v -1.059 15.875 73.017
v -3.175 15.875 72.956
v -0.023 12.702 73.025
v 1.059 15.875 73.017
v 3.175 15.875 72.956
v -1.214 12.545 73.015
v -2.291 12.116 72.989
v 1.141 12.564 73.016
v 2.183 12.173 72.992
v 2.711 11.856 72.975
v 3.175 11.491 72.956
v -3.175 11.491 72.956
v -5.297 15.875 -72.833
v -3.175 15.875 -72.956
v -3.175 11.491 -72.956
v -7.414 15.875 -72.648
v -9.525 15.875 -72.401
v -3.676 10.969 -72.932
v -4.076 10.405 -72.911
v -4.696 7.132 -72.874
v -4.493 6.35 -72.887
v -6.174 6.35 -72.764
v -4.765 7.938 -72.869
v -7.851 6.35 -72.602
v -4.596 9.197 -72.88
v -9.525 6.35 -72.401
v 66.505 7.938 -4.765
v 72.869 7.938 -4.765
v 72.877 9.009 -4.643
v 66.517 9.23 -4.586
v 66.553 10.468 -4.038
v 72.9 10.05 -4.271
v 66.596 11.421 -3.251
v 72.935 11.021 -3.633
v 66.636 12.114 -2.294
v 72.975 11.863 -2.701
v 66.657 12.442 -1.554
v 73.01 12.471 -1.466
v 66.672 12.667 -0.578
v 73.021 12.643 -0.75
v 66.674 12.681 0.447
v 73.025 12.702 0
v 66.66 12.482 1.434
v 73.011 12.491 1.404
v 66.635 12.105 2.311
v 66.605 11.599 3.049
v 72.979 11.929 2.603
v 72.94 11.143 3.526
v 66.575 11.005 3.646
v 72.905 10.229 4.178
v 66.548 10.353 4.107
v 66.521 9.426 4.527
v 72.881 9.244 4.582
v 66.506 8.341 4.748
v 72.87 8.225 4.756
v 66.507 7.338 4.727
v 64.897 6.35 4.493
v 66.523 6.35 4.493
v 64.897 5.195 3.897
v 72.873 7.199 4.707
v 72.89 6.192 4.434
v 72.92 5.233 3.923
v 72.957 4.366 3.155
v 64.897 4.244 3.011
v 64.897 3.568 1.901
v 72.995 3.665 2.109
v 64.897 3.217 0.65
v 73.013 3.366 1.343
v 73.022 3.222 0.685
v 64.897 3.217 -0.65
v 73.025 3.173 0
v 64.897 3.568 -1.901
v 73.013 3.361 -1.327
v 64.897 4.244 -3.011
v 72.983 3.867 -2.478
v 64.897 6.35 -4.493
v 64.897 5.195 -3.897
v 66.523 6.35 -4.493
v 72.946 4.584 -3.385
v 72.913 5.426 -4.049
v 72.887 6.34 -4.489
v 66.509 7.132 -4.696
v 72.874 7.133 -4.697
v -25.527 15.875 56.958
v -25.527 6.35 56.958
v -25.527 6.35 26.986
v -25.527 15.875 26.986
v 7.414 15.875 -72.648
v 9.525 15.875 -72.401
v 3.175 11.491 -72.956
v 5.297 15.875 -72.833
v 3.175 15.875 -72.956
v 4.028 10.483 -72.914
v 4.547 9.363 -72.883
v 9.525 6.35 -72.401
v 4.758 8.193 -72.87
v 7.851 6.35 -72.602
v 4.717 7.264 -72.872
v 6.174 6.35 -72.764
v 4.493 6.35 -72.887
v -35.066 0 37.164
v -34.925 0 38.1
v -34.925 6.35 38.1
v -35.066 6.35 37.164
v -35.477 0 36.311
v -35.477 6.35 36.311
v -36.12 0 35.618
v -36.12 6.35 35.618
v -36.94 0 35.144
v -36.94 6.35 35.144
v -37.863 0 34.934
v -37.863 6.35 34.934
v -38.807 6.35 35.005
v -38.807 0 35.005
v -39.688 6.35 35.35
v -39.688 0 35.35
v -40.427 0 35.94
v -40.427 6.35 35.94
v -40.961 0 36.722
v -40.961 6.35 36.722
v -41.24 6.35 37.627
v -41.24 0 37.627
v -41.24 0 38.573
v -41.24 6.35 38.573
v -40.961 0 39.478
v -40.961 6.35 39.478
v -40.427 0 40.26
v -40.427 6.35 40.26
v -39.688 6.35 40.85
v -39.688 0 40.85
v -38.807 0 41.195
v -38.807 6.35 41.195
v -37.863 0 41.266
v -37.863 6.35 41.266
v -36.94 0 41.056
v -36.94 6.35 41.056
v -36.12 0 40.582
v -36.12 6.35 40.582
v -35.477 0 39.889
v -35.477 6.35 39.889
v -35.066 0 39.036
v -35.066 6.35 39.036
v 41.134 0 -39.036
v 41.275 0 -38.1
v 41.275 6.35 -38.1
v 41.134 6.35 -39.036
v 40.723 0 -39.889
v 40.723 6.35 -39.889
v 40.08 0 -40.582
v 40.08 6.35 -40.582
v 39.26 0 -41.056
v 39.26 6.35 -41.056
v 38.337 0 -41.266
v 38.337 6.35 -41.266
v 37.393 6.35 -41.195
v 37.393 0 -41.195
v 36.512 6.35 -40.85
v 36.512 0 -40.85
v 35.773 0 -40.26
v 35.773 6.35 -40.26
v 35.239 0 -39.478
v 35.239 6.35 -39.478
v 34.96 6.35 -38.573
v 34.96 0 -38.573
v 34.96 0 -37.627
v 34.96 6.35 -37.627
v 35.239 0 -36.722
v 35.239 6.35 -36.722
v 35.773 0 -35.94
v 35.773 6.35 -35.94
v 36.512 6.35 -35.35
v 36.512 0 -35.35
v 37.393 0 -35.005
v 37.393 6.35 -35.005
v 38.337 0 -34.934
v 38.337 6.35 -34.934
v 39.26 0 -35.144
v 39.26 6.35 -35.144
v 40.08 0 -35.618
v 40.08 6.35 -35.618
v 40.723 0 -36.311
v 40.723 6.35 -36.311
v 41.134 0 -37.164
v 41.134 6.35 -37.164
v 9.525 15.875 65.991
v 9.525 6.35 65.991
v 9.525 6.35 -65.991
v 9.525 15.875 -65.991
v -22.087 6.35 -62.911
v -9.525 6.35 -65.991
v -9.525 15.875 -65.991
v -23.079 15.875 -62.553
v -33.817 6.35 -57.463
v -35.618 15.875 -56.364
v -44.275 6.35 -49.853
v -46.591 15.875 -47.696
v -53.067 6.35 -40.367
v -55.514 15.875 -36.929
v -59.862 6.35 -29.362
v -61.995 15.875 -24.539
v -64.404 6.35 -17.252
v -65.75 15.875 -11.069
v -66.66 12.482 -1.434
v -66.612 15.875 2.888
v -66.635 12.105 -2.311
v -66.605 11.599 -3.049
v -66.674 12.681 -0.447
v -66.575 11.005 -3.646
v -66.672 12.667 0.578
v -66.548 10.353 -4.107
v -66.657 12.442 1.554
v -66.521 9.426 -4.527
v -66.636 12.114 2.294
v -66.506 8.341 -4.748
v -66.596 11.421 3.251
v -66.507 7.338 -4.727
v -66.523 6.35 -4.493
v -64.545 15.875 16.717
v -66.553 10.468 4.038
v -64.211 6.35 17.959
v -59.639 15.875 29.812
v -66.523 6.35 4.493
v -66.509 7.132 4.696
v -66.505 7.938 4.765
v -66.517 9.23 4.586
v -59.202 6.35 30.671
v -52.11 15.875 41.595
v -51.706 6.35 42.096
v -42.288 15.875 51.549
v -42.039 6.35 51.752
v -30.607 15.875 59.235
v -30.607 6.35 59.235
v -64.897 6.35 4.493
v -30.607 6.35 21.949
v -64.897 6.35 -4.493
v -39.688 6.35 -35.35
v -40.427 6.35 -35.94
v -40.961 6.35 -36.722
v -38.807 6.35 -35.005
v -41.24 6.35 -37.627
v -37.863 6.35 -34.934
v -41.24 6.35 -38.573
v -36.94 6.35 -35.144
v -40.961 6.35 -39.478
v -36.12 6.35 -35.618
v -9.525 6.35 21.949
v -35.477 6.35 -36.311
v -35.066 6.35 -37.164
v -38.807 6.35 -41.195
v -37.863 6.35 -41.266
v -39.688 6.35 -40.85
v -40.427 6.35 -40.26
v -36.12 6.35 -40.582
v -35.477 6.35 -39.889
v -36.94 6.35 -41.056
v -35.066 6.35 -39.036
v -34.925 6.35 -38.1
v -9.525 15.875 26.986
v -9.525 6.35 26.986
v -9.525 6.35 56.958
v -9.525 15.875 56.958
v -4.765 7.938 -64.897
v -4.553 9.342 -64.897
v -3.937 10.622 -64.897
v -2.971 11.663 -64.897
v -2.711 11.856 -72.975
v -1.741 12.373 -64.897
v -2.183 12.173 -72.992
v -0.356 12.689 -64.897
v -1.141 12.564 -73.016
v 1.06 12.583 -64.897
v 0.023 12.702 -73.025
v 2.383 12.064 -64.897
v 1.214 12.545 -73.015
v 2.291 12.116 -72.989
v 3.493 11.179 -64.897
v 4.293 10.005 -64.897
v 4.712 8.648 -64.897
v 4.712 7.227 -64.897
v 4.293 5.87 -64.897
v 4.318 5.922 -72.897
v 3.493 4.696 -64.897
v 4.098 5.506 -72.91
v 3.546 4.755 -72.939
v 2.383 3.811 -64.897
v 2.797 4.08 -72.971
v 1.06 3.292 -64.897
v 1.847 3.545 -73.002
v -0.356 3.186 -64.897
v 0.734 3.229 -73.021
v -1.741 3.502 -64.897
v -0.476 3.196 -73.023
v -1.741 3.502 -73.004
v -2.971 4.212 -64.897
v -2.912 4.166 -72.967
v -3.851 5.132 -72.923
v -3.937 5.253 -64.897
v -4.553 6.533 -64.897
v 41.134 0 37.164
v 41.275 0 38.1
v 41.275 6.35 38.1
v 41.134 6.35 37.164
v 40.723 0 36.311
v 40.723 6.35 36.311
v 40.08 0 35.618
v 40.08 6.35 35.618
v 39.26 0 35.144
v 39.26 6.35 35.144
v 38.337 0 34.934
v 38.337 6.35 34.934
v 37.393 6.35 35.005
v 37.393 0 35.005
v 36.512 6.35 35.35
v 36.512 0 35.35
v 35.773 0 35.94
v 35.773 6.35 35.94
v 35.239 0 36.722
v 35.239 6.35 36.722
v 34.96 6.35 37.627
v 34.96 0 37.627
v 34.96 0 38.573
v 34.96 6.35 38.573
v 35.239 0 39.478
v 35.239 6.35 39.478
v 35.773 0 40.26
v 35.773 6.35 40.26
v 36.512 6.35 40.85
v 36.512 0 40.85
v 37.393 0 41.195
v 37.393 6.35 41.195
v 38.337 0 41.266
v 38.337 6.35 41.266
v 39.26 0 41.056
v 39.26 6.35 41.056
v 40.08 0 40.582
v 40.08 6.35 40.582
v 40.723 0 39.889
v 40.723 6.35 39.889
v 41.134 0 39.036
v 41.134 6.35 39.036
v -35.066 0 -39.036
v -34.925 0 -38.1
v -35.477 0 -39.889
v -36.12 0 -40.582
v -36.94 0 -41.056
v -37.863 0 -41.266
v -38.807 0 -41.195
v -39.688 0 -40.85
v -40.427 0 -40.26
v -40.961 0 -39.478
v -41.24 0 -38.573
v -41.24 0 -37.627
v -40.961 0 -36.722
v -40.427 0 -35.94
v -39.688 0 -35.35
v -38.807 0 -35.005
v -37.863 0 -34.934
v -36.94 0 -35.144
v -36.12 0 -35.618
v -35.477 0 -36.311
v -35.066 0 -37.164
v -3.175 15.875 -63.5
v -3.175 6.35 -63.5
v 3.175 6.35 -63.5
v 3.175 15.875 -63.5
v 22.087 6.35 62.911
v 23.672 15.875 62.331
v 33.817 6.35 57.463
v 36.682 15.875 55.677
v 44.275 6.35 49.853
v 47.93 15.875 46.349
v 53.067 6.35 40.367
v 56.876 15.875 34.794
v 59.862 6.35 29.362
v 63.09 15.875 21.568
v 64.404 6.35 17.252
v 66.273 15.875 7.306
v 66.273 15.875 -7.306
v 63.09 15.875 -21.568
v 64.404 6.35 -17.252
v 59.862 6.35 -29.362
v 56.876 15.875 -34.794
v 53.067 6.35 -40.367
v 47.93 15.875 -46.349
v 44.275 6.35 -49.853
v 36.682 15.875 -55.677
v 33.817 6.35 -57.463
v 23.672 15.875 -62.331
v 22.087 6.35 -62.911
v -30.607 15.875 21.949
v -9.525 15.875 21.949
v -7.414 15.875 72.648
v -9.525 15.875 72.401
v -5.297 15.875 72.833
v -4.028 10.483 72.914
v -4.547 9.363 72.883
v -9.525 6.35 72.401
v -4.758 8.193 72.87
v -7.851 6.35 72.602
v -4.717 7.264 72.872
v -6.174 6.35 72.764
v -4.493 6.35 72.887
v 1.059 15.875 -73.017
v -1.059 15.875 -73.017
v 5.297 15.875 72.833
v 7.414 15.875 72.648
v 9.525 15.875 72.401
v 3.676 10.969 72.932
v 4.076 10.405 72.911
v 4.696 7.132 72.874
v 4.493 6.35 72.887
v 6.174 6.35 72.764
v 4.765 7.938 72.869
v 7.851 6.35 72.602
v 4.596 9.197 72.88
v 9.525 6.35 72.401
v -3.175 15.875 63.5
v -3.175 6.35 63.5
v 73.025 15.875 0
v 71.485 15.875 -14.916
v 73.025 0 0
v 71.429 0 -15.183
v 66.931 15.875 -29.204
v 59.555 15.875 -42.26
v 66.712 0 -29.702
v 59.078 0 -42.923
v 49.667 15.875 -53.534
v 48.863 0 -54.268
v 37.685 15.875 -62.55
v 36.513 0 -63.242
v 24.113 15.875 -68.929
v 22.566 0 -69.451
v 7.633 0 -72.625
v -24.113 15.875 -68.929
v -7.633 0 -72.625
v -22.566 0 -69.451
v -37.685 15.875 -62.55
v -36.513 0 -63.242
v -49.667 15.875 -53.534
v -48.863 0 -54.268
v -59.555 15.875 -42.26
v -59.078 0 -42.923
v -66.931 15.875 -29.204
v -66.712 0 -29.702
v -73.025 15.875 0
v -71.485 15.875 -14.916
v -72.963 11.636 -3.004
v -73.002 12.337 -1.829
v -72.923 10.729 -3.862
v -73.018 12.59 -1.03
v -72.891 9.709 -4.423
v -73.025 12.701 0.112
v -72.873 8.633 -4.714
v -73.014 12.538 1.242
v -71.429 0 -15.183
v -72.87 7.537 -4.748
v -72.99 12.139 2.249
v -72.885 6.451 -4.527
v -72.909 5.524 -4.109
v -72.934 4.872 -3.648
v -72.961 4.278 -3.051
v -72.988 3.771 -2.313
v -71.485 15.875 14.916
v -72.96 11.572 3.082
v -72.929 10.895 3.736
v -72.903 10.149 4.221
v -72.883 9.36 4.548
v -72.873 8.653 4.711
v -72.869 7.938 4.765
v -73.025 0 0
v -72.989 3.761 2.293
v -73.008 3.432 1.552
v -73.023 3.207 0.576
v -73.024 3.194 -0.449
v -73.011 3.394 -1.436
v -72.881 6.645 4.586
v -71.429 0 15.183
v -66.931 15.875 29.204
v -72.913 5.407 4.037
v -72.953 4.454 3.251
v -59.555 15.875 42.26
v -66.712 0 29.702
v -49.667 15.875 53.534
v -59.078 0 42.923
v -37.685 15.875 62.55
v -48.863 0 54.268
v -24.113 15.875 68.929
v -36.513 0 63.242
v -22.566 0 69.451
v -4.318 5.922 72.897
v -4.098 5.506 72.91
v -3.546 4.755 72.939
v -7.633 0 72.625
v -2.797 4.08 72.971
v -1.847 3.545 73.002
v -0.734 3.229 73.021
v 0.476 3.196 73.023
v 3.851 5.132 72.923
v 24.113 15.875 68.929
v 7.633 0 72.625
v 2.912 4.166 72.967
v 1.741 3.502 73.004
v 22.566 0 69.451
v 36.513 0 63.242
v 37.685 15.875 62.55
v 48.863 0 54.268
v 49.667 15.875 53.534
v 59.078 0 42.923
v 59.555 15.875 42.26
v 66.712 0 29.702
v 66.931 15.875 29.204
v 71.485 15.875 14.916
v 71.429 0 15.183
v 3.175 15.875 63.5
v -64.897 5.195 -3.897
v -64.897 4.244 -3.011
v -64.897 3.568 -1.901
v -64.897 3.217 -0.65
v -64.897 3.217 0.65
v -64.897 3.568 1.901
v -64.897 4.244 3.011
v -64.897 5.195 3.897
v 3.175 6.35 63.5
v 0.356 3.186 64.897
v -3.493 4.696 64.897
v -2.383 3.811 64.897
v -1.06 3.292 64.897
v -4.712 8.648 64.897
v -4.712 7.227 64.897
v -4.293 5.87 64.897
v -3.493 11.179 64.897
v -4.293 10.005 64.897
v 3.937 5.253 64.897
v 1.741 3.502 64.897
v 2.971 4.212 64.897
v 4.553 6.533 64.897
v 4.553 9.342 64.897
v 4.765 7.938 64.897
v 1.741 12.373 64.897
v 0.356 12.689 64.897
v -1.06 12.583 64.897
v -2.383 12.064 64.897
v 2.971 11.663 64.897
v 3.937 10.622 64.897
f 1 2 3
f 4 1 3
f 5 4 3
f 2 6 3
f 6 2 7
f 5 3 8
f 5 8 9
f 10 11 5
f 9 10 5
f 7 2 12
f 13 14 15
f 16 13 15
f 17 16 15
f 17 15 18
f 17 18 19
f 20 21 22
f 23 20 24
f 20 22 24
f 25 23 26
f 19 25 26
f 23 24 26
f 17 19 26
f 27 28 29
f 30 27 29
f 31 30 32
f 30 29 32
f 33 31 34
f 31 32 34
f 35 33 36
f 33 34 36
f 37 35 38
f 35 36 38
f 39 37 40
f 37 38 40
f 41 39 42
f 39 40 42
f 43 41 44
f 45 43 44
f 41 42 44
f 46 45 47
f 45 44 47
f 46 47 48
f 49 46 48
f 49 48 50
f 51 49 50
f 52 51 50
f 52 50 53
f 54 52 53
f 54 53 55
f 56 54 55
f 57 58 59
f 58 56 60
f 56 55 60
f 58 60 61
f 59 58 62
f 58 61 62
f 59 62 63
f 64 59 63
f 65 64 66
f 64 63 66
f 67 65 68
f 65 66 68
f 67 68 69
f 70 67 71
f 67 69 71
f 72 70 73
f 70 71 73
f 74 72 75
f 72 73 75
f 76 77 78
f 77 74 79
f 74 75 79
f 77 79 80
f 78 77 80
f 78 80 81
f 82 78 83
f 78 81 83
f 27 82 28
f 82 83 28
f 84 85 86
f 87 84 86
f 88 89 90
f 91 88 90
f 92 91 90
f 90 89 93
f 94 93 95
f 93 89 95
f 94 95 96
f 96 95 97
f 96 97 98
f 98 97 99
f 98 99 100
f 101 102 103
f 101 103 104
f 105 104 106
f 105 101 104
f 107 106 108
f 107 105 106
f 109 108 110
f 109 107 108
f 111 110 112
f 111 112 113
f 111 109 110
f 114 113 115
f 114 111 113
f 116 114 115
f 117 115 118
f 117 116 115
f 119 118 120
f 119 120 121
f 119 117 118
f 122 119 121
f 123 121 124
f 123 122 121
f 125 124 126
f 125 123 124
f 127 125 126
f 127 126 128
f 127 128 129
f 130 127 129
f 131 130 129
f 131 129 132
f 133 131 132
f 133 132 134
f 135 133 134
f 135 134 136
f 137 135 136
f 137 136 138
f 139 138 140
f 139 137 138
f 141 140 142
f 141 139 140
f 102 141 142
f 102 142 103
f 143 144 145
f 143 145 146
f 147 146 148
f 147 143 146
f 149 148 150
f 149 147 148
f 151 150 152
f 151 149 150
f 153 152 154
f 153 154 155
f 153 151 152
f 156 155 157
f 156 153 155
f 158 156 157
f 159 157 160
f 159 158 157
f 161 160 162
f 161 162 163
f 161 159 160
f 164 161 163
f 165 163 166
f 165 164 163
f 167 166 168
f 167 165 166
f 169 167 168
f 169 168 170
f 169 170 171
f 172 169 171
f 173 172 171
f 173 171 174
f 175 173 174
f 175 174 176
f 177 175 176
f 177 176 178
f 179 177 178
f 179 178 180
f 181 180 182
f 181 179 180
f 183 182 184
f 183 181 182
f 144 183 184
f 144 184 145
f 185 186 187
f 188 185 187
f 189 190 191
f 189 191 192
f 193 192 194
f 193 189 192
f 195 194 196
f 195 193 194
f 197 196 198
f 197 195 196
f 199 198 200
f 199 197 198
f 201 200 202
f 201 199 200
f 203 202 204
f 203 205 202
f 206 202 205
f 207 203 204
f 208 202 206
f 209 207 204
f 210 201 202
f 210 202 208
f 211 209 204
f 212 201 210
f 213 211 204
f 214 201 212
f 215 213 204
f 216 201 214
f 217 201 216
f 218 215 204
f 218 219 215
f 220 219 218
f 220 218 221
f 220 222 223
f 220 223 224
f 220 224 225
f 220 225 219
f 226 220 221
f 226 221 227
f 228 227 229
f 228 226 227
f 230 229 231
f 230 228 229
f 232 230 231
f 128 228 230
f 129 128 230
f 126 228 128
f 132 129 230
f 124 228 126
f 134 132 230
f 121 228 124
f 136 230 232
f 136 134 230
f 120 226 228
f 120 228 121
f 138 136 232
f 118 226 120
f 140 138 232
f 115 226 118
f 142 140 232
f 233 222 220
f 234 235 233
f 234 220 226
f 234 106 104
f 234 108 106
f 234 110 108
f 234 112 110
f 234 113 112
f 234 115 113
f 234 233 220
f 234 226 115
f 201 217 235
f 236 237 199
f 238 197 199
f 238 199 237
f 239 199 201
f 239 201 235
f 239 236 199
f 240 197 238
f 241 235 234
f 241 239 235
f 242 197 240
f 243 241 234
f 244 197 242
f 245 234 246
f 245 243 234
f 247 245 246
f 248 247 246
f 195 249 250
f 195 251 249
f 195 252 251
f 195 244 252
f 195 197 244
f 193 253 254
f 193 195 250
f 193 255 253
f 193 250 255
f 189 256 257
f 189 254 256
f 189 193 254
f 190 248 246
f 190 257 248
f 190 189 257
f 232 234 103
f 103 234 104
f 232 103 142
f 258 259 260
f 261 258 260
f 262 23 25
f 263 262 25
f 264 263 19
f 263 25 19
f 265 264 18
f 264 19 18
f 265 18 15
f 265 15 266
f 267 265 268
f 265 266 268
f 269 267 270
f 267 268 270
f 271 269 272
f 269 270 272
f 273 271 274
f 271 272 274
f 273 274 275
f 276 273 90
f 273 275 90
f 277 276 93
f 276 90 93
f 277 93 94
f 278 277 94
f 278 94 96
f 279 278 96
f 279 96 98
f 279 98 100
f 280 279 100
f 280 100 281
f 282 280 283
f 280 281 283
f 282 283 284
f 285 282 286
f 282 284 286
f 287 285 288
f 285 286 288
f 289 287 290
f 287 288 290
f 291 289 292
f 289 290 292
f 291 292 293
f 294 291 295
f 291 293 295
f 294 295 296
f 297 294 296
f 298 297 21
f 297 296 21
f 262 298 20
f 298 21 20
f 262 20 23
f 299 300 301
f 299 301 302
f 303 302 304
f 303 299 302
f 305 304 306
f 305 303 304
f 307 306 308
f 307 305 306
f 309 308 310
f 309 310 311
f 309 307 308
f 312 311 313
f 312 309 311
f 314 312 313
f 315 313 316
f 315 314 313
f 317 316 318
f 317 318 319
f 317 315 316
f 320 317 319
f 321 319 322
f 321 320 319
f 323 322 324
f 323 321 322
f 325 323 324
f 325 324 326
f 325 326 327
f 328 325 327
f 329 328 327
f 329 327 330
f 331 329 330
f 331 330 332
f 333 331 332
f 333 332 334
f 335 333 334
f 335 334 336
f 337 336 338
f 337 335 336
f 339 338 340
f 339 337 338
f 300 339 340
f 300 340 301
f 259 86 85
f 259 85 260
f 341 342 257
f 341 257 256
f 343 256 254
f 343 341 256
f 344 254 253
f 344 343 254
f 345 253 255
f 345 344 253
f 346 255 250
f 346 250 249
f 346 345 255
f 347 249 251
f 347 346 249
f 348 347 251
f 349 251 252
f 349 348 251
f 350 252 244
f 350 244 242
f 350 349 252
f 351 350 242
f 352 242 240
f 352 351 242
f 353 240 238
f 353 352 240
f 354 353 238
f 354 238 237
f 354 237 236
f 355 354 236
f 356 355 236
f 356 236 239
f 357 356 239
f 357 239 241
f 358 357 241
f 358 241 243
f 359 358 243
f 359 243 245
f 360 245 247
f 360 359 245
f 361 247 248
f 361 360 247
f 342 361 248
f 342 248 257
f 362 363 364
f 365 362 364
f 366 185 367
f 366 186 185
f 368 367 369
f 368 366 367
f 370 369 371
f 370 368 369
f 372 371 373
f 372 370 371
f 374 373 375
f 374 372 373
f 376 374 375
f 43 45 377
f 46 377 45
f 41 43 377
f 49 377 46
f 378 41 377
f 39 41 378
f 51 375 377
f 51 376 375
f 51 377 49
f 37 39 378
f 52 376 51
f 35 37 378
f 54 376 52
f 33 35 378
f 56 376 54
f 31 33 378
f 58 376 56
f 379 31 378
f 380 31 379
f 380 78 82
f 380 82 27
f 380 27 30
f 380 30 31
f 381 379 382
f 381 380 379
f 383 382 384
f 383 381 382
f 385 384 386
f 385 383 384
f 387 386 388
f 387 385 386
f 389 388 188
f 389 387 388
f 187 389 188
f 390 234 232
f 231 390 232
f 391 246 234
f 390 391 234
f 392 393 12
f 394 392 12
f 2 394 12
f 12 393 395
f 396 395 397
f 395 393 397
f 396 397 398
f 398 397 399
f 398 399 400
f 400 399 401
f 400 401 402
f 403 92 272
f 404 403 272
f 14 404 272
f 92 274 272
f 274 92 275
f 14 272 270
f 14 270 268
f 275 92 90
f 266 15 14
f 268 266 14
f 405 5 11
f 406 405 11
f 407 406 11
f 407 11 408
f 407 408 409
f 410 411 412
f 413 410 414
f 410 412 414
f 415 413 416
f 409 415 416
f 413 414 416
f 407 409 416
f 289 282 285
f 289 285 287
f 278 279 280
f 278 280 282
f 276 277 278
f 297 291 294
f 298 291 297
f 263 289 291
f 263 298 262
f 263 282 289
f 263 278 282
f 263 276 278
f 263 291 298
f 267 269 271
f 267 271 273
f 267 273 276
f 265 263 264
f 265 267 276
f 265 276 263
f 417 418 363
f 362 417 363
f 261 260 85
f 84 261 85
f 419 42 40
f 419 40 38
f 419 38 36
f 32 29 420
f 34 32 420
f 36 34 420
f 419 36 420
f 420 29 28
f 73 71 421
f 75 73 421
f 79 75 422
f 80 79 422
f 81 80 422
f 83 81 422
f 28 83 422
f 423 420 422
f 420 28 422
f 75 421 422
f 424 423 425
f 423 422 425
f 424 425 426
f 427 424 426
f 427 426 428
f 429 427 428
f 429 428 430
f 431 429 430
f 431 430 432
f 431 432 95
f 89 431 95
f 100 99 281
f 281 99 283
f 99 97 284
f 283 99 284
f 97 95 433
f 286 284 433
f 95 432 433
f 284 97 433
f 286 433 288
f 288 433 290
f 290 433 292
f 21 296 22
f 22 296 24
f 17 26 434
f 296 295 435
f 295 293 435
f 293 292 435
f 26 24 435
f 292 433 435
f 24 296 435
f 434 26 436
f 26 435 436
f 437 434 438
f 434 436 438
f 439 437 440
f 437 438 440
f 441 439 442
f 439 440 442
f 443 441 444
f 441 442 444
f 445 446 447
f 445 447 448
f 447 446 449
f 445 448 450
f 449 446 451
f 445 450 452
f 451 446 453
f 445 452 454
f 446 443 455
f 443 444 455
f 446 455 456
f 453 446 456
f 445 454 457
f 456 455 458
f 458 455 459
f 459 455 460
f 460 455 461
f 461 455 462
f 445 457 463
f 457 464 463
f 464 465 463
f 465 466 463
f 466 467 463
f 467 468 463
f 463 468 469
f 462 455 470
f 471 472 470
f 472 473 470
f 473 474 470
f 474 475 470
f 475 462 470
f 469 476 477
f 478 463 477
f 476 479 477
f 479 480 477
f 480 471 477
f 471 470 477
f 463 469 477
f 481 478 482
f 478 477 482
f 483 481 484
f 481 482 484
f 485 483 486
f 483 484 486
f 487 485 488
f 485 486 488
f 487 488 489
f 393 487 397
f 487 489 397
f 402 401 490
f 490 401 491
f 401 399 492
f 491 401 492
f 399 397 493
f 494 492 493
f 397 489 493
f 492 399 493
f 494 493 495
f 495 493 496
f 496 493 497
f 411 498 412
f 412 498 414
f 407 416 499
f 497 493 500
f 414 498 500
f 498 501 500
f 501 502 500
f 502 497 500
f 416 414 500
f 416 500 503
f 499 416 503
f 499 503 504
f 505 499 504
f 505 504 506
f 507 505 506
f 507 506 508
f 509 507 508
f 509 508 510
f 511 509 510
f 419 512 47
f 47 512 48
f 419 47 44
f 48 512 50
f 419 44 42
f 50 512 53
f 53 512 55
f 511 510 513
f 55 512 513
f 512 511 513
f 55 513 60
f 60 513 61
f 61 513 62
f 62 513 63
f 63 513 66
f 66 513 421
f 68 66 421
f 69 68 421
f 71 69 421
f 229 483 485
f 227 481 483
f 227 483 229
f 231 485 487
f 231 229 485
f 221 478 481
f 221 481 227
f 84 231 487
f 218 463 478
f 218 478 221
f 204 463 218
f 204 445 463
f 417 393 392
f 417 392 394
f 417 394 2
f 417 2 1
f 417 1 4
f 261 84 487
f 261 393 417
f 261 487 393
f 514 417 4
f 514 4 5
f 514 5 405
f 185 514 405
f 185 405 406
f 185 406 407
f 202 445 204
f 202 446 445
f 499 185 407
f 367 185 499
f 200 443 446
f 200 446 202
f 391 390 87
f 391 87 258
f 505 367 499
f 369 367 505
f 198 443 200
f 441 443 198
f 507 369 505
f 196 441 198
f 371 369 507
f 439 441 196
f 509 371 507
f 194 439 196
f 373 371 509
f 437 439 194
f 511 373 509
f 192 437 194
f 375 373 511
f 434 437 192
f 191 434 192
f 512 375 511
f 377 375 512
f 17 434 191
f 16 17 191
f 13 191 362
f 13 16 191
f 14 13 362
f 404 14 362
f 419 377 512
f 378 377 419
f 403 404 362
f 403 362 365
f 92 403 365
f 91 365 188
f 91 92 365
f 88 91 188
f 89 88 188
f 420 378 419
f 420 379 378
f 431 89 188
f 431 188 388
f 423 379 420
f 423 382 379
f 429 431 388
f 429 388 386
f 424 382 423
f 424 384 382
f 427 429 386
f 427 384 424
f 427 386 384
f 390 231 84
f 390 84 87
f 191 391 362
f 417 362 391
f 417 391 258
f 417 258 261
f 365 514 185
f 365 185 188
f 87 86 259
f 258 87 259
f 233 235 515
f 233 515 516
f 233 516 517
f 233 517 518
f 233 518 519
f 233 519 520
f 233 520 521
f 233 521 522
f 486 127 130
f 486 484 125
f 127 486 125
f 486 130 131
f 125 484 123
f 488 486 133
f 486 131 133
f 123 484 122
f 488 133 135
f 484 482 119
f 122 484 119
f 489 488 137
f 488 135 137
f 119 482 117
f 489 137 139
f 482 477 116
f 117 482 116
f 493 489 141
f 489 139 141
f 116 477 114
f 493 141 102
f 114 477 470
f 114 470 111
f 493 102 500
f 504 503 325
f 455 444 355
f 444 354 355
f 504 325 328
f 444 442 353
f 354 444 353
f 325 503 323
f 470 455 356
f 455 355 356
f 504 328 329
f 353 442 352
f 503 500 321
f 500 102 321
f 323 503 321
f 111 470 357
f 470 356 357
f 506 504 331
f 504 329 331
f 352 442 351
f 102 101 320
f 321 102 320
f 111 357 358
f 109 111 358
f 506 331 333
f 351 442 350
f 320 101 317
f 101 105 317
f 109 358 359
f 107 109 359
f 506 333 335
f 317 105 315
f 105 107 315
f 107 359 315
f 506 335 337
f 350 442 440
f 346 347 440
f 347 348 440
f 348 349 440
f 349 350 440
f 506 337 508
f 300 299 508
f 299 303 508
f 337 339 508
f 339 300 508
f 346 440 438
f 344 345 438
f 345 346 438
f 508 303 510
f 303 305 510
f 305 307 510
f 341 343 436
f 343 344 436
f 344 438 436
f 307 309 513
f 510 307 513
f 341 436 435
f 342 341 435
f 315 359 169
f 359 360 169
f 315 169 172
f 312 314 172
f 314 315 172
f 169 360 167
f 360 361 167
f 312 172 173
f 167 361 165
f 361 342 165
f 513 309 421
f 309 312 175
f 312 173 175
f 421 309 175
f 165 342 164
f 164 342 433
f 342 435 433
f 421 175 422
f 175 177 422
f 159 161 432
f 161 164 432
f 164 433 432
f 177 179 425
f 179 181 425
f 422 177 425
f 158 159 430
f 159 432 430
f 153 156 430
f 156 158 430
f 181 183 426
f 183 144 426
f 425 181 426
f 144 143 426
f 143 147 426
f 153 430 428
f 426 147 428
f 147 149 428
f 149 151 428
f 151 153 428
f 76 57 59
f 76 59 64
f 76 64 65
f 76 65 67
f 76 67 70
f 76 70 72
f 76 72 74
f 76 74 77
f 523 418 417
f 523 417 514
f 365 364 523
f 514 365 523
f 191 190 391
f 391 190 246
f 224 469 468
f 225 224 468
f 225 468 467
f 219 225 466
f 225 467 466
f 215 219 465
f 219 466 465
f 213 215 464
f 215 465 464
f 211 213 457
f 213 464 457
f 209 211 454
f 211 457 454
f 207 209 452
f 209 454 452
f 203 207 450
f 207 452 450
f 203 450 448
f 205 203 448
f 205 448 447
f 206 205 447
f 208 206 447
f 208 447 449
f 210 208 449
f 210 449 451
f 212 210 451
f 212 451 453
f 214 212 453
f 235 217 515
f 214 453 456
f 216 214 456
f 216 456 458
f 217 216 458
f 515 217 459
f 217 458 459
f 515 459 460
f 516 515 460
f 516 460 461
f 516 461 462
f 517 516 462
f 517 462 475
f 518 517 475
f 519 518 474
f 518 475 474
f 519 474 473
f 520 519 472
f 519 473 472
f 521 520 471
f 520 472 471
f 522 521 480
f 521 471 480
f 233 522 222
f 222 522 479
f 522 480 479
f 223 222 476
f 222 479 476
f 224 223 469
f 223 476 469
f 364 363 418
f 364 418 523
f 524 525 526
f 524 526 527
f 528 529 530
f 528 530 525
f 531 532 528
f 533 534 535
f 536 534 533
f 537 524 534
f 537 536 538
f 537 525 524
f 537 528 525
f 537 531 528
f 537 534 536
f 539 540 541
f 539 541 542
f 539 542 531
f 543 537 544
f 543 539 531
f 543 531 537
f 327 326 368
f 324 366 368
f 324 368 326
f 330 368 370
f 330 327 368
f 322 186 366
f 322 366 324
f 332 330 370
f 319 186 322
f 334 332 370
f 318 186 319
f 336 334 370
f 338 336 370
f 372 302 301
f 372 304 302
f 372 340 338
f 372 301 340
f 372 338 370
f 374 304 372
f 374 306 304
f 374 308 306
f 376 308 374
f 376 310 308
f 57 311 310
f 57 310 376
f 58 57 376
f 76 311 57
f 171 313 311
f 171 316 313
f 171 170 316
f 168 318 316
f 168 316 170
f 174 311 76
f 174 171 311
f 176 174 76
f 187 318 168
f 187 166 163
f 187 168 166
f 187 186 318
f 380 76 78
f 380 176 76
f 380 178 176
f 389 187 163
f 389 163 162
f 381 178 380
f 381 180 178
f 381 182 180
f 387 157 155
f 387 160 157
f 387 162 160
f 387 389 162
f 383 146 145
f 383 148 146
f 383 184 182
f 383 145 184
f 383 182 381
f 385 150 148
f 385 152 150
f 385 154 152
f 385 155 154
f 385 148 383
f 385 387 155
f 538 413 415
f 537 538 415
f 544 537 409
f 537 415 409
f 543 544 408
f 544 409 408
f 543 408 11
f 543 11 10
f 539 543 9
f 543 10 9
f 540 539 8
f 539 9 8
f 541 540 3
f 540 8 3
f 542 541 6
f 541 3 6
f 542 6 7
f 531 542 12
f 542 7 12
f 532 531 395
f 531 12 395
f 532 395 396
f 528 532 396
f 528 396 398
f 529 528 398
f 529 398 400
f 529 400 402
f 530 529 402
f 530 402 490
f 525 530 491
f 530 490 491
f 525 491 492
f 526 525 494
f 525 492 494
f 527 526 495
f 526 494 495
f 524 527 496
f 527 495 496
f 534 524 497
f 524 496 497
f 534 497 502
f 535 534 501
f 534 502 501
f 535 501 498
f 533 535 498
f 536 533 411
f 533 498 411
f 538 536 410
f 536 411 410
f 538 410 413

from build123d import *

# Parameters (mm, degrees)
SKETCH5_R           = 73.025
SKETCH5_R_2         = 3.175
PLATEBASE_DEPTH     = 6.35
PLATETOP_DEPTH      = 9.525
SKETCH9_R           = 73.025
SKETCH9_R_2         = 66.675
PLATEWALLS_DEPTH    = 9.525
PLATESLOTENDS_DEPTH = 9.525
BATTERYSLOT_DEPTH   = 9.525
SKETCH13_R          = 4.765
INSERTHOLE_DEPTH    = 8.128
INSERTHOLES_COUNT   = 4


with BuildPart() as part:
    # Sketch5 → PlateBase (new body)
    with BuildSketch(Plane(origin=(0, 0, 0), x_dir=(1, 0, 0), z_dir=(0, 1, 0))):
        Circle(SKETCH5_R)
        with Locations((38.1, 38.1)):
            Circle(SKETCH5_R_2, mode=Mode.SUBTRACT)
        with Locations((38.1, -38.1)):
            Circle(SKETCH5_R_2, mode=Mode.SUBTRACT)
        with Locations((-38.1, 38.1)):
            Circle(SKETCH5_R_2, mode=Mode.SUBTRACT)
        with Locations((-38.1, -38.1)):
            Circle(SKETCH5_R_2, mode=Mode.SUBTRACT)
    extrude(amount=PLATEBASE_DEPTH)

    # Sketch6 → PlateTop (add)
    with BuildSketch(Plane(origin=(0, 6.35, 0), x_dir=(1, 0, 0), z_dir=(0, 1, 0))):
        with BuildLine():
            Line((-3.175, 0), (-3.175, 72.955945611))
            ThreePointArc((-3.175, 72.955945611), (-6.35605636, 72.747860261), (-9.525, 72.401139494))
            Line((-9.525, 72.401139494), (-9.525, 0))
            Line((-9.525, 0), (-9.525, -72.401139494))
            ThreePointArc((-9.525, -72.401139494), (-6.35605636, -72.747860261), (-3.175, -72.955945611))
            Line((-3.175, -72.955945611), (-3.175, 0))
        make_face()
        with BuildLine():
            Line((3.175, 72.955945611), (3.175, 0))
            Line((3.175, 0), (3.175, -72.955945611))
            ThreePointArc((3.175, -72.955945611), (6.35605636, -72.747860261), (9.525, -72.401139494))
            Line((9.525, -72.401139494), (9.525, 0))
            Line((9.525, 0), (9.525, 72.401139494))
            ThreePointArc((9.525, 72.401139494), (6.35605636, 72.747860261), (3.175, 72.955945611))
        make_face()
    extrude(amount=PLATETOP_DEPTH)

    # Sketch9 → PlateWalls (add)
    with BuildSketch(Plane(origin=(0, 6.35, 0), x_dir=(1, 0, 0), z_dir=(0, 1, 0))):
        Circle(SKETCH9_R)
        Circle(SKETCH9_R_2, mode=Mode.SUBTRACT)
    extrude(amount=PLATEWALLS_DEPTH)

    # Sketch11 → PlateSlotEnds (add)
    with BuildSketch(Plane(origin=(0, 6.35, 0), x_dir=(1, 0, 0), z_dir=(0, 1, 0))):
        with BuildLine():
            Line((-3.175, -63.5), (3.175, -63.5))
            Line((3.175, -63.5), (3.175, -66.599361859))
            ThreePointArc((3.175, -66.599361859), (0, -66.675), (-3.175, -66.599361859))
            Line((-3.175, -66.599361859), (-3.175, -63.5))
        make_face()
        with BuildLine():
            Line((-3.175, 63.5), (3.175, 63.5))
            Line((3.175, 63.5), (3.175, 66.599361859))
            ThreePointArc((3.175, 66.599361859), (0, 66.675), (-3.175, 66.599361859))
            Line((-3.175, 66.599361859), (-3.175, 63.5))
        make_face()
    extrude(amount=PLATESLOTENDS_DEPTH)

    # Sketch12 → BatterySlot (add)
    with BuildSketch(Plane(origin=(0, 6.35, 0), x_dir=(1, 0, 0), z_dir=(0, 1, 0))):
        with BuildLine():
            Line((-9.525, -65.991135768), (-9.525, -56.958062669))
            Line((-9.525, -56.958062669), (-25.527, -56.958062669))
            Line((-25.527, -56.958062669), (-25.527, -26.986062669))
            Line((-25.527, -26.986062669), (-9.525, -26.986062669))
            Line((-9.525, -26.986062669), (-9.525, -21.948739215))
            Line((-9.525, -21.948739215), (-30.607, -21.948739215))
            Line((-30.607, -21.948739215), (-30.607, -59.234847649))
            ThreePointArc((-30.607, -59.234847649), (-20.348371269, -63.494089581), (-9.525, -65.991135768))
        make_face()
    extrude(amount=BATTERYSLOT_DEPTH)

    # Sketch13 → InsertHole (cut)
    with BuildSketch(Plane.XY.offset(73.025)):
        with Locations((0, 7.9375)):
            Circle(SKETCH13_R)
    inserthole = extrude(amount=-INSERTHOLE_DEPTH, mode=Mode.SUBTRACT)

    # InsertHoles: InsertHole ×4 about axis
    insertholes_axis = Axis((0, 0, 0), (0, 1, 0))
    for i in range(1, INSERTHOLES_COUNT):
        add(inserthole.rotate(insertholes_axis, i * 360 / INSERTHOLES_COUNT), mode=Mode.SUBTRACT)


solid = part.part
